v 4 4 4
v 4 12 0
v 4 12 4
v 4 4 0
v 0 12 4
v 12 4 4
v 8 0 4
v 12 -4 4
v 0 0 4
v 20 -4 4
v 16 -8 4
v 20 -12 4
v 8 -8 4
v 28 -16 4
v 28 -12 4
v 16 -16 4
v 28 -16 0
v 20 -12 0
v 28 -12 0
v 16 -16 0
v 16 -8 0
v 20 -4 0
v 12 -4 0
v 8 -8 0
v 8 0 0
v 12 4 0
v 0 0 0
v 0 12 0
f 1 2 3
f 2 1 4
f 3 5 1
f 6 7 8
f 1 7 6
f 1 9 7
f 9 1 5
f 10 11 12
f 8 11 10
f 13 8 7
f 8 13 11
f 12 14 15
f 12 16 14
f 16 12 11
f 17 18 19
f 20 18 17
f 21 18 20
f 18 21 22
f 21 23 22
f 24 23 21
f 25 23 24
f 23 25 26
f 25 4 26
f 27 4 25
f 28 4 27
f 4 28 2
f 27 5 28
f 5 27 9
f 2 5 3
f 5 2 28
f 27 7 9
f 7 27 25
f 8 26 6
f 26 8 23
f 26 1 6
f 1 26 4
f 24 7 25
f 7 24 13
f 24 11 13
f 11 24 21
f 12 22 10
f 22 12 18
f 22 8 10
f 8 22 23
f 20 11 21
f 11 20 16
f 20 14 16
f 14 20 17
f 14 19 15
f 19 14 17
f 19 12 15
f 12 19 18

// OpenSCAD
//Width of stick
w = 12;
//Height of stick
h = 4;
//Depth of stick
z = 4;
//Num of stick
num_sticks = 6; // Barrabes = 6

logo(w,h,z,num_sticks);

module logo(a=2, b=2,h=2,n=4) {
    for(i = [0:1:n-1]){
        ii = floor(i/2);
        if(i%2 ==0){
            translate([ii*(a-b), ii*(b-a)])
                cube([b,a,h]);
        }else{
            translate([ii*(a-b), ii*(b-a)])
                cube([a,b,h]);
        }
    }
}
